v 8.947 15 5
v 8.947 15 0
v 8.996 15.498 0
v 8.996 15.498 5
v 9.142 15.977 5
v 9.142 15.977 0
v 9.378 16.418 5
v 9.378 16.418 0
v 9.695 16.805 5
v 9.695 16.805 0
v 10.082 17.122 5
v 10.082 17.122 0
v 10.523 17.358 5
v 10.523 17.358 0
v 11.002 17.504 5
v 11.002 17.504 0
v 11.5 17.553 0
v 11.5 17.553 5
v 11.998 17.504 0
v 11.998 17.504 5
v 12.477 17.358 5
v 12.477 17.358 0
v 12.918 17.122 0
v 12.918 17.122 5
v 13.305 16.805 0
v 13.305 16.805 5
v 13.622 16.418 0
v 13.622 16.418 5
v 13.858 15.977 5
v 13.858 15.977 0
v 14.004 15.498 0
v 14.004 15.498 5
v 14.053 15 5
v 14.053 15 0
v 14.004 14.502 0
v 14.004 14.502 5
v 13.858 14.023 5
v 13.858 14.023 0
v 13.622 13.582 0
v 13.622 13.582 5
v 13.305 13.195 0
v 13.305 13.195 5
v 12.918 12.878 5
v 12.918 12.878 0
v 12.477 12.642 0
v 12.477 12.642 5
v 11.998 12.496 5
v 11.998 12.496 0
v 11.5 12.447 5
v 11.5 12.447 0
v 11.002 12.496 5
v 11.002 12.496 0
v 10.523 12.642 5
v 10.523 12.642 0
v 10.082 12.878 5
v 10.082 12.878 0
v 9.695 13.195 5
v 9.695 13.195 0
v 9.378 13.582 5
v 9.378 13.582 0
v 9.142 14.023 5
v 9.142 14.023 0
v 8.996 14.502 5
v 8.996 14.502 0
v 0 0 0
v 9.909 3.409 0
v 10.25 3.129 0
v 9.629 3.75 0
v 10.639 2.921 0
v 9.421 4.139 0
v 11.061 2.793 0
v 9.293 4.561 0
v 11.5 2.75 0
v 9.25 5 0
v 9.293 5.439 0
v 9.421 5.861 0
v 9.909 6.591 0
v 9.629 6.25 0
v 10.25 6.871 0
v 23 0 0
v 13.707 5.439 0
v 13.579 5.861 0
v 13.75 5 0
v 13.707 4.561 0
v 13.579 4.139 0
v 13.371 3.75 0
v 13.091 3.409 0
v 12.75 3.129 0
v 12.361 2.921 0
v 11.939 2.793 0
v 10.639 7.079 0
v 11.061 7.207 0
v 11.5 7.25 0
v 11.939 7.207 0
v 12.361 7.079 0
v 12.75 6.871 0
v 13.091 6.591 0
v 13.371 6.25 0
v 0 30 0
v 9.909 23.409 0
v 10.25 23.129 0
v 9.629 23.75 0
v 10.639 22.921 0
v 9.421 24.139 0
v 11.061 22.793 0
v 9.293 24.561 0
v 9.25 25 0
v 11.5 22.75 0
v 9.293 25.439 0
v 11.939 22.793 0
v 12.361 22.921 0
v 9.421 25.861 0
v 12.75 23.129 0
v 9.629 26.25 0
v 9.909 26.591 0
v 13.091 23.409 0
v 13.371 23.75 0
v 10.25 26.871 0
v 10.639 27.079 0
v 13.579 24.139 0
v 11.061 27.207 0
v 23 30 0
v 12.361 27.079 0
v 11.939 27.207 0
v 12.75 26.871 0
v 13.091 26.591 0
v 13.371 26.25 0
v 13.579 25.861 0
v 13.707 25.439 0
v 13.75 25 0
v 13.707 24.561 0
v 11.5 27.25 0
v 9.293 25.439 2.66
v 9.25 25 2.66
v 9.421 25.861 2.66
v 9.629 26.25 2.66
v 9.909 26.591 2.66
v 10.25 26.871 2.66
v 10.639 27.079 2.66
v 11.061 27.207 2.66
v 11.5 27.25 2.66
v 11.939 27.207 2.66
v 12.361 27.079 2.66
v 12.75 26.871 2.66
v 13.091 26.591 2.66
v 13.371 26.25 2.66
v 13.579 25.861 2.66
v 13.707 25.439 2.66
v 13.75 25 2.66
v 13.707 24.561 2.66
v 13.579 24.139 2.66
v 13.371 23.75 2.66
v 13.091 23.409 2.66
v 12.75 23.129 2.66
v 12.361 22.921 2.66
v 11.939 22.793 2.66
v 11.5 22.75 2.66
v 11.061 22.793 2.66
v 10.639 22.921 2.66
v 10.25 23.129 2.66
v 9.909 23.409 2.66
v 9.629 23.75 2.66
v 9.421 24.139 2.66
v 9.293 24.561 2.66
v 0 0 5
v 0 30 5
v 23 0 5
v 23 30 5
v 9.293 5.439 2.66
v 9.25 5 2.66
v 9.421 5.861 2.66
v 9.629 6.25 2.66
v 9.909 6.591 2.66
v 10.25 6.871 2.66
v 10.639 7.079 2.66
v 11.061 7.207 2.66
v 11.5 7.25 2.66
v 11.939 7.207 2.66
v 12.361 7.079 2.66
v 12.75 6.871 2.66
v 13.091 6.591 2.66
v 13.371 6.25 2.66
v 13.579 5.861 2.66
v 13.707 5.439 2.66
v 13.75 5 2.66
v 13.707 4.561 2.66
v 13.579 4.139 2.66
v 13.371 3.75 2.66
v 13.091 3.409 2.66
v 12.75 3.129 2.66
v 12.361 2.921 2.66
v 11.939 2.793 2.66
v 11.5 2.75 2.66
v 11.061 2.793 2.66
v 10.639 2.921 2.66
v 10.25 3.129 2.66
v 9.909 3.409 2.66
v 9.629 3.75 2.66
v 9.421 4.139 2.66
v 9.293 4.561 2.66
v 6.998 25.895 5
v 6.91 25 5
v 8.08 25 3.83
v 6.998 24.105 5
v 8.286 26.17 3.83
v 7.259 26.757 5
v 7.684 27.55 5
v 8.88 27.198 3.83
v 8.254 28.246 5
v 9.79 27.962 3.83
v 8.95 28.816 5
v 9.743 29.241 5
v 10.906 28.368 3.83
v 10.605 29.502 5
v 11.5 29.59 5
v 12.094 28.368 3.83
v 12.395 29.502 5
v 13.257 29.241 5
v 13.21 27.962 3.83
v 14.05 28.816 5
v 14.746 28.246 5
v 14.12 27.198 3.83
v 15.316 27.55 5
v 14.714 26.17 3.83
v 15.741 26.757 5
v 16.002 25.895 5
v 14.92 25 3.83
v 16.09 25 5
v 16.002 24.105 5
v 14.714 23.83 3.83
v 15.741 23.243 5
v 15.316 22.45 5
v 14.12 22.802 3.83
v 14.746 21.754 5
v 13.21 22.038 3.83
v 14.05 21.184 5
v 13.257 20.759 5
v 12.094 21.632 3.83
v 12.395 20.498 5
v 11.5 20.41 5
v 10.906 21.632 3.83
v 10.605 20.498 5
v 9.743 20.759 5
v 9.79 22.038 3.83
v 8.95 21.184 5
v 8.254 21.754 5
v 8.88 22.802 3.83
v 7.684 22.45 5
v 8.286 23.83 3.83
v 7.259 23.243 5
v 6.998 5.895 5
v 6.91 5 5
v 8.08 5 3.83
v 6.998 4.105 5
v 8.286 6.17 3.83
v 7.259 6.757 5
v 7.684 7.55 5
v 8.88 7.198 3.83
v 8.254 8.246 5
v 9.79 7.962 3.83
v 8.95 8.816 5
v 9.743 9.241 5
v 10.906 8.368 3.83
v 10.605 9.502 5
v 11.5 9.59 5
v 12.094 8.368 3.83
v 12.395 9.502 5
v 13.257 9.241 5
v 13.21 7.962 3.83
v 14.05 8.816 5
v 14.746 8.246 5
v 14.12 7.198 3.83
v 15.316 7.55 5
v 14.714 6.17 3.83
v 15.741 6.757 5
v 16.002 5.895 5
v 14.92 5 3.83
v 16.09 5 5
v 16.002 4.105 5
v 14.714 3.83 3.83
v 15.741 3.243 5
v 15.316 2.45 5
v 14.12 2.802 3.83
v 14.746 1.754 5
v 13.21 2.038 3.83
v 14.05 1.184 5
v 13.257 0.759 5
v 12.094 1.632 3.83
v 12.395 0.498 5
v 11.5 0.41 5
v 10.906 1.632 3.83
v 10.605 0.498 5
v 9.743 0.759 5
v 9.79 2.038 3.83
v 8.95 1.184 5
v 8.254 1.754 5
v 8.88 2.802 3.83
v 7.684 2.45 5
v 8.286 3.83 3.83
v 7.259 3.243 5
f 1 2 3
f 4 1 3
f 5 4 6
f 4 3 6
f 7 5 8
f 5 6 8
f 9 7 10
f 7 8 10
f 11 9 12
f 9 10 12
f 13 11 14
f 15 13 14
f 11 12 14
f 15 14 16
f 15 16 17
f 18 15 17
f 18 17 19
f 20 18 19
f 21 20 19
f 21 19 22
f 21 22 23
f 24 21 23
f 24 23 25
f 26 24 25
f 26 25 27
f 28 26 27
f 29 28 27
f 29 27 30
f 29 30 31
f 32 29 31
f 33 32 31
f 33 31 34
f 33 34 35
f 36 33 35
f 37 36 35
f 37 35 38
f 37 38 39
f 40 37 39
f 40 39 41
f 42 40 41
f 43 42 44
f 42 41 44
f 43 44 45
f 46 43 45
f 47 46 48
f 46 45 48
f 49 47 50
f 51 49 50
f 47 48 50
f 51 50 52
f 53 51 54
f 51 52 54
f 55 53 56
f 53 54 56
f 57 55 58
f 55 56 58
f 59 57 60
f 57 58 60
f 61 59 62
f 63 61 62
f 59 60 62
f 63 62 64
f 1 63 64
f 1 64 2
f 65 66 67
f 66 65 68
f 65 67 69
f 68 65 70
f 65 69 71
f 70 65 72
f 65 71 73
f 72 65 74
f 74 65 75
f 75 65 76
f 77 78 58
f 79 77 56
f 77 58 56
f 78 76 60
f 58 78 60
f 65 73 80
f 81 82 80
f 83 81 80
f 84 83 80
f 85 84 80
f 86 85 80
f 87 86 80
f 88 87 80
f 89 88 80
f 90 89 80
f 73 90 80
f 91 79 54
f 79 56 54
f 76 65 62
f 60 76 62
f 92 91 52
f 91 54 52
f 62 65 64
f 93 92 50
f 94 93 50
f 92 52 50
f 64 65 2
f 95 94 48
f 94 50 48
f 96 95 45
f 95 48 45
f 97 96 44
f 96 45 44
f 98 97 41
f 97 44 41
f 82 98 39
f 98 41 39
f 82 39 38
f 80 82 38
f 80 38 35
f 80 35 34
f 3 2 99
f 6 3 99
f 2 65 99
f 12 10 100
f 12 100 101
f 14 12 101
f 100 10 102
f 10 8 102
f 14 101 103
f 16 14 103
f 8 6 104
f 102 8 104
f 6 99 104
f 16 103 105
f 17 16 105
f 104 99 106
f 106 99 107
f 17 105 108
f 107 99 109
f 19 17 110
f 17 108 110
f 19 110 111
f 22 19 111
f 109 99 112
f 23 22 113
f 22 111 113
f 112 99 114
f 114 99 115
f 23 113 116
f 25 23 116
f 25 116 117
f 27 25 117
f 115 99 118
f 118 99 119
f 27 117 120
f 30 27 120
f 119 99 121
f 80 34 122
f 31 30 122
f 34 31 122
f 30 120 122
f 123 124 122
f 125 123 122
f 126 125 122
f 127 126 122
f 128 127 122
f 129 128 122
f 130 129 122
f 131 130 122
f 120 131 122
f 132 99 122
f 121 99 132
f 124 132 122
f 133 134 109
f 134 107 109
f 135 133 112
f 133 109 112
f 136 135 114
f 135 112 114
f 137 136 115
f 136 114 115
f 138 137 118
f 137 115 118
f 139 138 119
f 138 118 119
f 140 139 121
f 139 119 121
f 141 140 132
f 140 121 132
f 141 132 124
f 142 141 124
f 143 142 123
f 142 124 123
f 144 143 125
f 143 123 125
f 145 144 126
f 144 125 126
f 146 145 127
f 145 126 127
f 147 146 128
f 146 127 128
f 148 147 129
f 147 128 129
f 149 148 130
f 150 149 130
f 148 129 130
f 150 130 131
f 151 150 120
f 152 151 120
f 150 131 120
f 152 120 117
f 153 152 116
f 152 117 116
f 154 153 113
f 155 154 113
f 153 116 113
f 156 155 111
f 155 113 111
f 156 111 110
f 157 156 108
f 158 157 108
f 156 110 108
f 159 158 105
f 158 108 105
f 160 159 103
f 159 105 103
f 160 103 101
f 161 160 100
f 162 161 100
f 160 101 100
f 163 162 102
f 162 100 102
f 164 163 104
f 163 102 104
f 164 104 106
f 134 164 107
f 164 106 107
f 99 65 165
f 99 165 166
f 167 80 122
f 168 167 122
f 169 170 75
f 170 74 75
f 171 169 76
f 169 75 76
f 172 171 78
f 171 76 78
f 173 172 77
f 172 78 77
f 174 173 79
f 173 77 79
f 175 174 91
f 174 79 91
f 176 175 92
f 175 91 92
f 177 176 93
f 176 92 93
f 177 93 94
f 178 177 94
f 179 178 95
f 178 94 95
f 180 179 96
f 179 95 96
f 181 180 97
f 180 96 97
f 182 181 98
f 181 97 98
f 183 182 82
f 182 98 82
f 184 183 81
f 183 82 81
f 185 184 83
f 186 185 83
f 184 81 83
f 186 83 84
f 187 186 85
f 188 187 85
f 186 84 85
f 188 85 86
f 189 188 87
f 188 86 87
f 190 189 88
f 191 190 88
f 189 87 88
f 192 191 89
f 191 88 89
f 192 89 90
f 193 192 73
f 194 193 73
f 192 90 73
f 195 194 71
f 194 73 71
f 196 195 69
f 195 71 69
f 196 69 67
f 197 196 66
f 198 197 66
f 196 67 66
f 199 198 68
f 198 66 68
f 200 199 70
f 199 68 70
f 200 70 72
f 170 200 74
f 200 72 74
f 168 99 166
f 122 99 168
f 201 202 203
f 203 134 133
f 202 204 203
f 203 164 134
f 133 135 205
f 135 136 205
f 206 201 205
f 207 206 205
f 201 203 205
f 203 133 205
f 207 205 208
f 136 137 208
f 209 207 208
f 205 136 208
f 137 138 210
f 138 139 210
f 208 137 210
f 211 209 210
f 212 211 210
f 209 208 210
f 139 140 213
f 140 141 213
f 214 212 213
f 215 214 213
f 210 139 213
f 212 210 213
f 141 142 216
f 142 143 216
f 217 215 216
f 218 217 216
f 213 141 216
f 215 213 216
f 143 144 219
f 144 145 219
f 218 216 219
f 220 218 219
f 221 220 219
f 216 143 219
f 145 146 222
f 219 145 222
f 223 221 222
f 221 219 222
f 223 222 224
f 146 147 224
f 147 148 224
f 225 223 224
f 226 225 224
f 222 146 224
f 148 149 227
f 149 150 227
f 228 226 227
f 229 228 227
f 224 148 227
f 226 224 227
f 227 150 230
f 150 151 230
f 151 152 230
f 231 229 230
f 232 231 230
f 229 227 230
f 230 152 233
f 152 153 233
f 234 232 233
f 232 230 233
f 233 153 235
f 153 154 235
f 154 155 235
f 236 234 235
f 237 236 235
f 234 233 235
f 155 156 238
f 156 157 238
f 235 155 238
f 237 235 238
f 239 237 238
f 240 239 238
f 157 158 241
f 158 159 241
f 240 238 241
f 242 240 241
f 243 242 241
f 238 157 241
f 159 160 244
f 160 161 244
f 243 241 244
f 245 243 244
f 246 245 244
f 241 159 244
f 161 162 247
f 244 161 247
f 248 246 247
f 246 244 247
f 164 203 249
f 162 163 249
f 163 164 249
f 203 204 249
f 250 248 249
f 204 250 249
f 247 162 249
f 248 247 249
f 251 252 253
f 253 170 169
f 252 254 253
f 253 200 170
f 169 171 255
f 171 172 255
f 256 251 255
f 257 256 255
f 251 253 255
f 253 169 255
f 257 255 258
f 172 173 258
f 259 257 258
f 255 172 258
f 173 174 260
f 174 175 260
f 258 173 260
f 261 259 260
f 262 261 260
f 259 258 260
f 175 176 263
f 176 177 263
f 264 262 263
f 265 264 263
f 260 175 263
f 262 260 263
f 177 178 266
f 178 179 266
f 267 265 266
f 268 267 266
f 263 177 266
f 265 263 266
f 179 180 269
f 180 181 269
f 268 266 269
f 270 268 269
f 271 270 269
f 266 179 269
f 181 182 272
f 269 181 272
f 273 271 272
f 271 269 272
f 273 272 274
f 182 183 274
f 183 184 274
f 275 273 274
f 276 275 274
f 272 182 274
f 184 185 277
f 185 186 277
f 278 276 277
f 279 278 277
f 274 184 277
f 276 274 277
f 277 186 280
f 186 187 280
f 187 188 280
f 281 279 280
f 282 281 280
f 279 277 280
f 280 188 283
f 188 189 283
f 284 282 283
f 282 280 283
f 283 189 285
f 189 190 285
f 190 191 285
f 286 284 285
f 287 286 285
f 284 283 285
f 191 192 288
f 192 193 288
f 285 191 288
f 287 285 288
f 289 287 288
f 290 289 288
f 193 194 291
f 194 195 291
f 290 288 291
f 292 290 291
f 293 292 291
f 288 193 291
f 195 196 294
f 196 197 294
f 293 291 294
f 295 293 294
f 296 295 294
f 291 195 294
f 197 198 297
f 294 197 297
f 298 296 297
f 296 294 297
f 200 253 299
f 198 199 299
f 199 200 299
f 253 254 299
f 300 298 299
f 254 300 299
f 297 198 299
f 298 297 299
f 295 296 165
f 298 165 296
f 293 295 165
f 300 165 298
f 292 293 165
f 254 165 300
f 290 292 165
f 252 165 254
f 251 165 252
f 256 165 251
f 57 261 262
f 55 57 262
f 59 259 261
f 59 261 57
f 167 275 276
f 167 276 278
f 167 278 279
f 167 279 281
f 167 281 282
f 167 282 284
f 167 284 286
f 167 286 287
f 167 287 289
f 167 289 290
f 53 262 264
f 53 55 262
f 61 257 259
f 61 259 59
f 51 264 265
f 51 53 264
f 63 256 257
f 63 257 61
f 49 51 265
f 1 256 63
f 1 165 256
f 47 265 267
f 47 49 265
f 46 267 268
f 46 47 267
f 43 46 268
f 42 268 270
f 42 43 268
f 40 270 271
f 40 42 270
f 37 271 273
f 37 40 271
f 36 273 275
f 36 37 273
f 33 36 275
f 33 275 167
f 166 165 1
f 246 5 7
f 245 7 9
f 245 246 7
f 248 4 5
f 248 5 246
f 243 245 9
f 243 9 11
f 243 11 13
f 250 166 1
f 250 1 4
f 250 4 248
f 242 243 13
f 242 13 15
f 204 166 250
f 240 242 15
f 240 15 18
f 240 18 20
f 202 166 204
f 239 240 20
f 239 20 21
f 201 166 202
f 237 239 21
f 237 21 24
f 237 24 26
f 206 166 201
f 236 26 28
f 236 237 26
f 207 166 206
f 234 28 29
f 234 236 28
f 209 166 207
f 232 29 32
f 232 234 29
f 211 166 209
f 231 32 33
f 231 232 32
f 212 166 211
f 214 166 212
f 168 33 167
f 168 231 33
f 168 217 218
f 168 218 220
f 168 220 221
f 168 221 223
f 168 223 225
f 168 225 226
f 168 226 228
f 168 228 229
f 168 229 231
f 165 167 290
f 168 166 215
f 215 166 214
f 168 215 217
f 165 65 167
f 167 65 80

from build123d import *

# Parameters (mm, degrees)
SKIZZE1_W                                            = 23
SKIZZE1_H                                            = 30
AUFSATZ_LINEAR_AUSTRAGEN1_DEPTH                      = 5
FORMSENKUNG_F_R_M4_SENKSCHRAUBE_MIT_INNE_D           = 4.5
FORMSENKUNG_F_R_M4_SENKSCHRAUBE_MIT_INNE_CSINK_D     = 9.18
FORMSENKUNG_F_R_M4_SENKSCHRAUBE_MIT_INNE_CSINK_ANGLE = 90
F_1_4_20_GEWINDEBOHRUNG1_D                           = 5.1054


with BuildPart() as part:
    # Skizze1 → Aufsatz-Linear austragen1 (new body)
    with BuildSketch(Plane.XY):
        with Locations((11.5, 15)):
            Rectangle(SKIZZE1_W, SKIZZE1_H)
    extrude(amount=AUFSATZ_LINEAR_AUSTRAGEN1_DEPTH)

    # Formsenkung für M4 Senkschraube mit Innensechskant1 (through all)
    with Locations(Plane.XY.offset(5)):
        with Locations((11.5, 25), (11.5, 5)):
            CounterSinkHole(FORMSENKUNG_F_R_M4_SENKSCHRAUBE_MIT_INNE_D / 2, FORMSENKUNG_F_R_M4_SENKSCHRAUBE_MIT_INNE_CSINK_D / 2, counter_sink_angle=FORMSENKUNG_F_R_M4_SENKSCHRAUBE_MIT_INNE_CSINK_ANGLE)

    # 1/4-20 Gewindebohrung1 (through all)
    with Locations(Plane.XY.offset(5)):
        with Locations((11.5, 15)):
            Hole(F_1_4_20_GEWINDEBOHRUNG1_D / 2)


solid = part.part
